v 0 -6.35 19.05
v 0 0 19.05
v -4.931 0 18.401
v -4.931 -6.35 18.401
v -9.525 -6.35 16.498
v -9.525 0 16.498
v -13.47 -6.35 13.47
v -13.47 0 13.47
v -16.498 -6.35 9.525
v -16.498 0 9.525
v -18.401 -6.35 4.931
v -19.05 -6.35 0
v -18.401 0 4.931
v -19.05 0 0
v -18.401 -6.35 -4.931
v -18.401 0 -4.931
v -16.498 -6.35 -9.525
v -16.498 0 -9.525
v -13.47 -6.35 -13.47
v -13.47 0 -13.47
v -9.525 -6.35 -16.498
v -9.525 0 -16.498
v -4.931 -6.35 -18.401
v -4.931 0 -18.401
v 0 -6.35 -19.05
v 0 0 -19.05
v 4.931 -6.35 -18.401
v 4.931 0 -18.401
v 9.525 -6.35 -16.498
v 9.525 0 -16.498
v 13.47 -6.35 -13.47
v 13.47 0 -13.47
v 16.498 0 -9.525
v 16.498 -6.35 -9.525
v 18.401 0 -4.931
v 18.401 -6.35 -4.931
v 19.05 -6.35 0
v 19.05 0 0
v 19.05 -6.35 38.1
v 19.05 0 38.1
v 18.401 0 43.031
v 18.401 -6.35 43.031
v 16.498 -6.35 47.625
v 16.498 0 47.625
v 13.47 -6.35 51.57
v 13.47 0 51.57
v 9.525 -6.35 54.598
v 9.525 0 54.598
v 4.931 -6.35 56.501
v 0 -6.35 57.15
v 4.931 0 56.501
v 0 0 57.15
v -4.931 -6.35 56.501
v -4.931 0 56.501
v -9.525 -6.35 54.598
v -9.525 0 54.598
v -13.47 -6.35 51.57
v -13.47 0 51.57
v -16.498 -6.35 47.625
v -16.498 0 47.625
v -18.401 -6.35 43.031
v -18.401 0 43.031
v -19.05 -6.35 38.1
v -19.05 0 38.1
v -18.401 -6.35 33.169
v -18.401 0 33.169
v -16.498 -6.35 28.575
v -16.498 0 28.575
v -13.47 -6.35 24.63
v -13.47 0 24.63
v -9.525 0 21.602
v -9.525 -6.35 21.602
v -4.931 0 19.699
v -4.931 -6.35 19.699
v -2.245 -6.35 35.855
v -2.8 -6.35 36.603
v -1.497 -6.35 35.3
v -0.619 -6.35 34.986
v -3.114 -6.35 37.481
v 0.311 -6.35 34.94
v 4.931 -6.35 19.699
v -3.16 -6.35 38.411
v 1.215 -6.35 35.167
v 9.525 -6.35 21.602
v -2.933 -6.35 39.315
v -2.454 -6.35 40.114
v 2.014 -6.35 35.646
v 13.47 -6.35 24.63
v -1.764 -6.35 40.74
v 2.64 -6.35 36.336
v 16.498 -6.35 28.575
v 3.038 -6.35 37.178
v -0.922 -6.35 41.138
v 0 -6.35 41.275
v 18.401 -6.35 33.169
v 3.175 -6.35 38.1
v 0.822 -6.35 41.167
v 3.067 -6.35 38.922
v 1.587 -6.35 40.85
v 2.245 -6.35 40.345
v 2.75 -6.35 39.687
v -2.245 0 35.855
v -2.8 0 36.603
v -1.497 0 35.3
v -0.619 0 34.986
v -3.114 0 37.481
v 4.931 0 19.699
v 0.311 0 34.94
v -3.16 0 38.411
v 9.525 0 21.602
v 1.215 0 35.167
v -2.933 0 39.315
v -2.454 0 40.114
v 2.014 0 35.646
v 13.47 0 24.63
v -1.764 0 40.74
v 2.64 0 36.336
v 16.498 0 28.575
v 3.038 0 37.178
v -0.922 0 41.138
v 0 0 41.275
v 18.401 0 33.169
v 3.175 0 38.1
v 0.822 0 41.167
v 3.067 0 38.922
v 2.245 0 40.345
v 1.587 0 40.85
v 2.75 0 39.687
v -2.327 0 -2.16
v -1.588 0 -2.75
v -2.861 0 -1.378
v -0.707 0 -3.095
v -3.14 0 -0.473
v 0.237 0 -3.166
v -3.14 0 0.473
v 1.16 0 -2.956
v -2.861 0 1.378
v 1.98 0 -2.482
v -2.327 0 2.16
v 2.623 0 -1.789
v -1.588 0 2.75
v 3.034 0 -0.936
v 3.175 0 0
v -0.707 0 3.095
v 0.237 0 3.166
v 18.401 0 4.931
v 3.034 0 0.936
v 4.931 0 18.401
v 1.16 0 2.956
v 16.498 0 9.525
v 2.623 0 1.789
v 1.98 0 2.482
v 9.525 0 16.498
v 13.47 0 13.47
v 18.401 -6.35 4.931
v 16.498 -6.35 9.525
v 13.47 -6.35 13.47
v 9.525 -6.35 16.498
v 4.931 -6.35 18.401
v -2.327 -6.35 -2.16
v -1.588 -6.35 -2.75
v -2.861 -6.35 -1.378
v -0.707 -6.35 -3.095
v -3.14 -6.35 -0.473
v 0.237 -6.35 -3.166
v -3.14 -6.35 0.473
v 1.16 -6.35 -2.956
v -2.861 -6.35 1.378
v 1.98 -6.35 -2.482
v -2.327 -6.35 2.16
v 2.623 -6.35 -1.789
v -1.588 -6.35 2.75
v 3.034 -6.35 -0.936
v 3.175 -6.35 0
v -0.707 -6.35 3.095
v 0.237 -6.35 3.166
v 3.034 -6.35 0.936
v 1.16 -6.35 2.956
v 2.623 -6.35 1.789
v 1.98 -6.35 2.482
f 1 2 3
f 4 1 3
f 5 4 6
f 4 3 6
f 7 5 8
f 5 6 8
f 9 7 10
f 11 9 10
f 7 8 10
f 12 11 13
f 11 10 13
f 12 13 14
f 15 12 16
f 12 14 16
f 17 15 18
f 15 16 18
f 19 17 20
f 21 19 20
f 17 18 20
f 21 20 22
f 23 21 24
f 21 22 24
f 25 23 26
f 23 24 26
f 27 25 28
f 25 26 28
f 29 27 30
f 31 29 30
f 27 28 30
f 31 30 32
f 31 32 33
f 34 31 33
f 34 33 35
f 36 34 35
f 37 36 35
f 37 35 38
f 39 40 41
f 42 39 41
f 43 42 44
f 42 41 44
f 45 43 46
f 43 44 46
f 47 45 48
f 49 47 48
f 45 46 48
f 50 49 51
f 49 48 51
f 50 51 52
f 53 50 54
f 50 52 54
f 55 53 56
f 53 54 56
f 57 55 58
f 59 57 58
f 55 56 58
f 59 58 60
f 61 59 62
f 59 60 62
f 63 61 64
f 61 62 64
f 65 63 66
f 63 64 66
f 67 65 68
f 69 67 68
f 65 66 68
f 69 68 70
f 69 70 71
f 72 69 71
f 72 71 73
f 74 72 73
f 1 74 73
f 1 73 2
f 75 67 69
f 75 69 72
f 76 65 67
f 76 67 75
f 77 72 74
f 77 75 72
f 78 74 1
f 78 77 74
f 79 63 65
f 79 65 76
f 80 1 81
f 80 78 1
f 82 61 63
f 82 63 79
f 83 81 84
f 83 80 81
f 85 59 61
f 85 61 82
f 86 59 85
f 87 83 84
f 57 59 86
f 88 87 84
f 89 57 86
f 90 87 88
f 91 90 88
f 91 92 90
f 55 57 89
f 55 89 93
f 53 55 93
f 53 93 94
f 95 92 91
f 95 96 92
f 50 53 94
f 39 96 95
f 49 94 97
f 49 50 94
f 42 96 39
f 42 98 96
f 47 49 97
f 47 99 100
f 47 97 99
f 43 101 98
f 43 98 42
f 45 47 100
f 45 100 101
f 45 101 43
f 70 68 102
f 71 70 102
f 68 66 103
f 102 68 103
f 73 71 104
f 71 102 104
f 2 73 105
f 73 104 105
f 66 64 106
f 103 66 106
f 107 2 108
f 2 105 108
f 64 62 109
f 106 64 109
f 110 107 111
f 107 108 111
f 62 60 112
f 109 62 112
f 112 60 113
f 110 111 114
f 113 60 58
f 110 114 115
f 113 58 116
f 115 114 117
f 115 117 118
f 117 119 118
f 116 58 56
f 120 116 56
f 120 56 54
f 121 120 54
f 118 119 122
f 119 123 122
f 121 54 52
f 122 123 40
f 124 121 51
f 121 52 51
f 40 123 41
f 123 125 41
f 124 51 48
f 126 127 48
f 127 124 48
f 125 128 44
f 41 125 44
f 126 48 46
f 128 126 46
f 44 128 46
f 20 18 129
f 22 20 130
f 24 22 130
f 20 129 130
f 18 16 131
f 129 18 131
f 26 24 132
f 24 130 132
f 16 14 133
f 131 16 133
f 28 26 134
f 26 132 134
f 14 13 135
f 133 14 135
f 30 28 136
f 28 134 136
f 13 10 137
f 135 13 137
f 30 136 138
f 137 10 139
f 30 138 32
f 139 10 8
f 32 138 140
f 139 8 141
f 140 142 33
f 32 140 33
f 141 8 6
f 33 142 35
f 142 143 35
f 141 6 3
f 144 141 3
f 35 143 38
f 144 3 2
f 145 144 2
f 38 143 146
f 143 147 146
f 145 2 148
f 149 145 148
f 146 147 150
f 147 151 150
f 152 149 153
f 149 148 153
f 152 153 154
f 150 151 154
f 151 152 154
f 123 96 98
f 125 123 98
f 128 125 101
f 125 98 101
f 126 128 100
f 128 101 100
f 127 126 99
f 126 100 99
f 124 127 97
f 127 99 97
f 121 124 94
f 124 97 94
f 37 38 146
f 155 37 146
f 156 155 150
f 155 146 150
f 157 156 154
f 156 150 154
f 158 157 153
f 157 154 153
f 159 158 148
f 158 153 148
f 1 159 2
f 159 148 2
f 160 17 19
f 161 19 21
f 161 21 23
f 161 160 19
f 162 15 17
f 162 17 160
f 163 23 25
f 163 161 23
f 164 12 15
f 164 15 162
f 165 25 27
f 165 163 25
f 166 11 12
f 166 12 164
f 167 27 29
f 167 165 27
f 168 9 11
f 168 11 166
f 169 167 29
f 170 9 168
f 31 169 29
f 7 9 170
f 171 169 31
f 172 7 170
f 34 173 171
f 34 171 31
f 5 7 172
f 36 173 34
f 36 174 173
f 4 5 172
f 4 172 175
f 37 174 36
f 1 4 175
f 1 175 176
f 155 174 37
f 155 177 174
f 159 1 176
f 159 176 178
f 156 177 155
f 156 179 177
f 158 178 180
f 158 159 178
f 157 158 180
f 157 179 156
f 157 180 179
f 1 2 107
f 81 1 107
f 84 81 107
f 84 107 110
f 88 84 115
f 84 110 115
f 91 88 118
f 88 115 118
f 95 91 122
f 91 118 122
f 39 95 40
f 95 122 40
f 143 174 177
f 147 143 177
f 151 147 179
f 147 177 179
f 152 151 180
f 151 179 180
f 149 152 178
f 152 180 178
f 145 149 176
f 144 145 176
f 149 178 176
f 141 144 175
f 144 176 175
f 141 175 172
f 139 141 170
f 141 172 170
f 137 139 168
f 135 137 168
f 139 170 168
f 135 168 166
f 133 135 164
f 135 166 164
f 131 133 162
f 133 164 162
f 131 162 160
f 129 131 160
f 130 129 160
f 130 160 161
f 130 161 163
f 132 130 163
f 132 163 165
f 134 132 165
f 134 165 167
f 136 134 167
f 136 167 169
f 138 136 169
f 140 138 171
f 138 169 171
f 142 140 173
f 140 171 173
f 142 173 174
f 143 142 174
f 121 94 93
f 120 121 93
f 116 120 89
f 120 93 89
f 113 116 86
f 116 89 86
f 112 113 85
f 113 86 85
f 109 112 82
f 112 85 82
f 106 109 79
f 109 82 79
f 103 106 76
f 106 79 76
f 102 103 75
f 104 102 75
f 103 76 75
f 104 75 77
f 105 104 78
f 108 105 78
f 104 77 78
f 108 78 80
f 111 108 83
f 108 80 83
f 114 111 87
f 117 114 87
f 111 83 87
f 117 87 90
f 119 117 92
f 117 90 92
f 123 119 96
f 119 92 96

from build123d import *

# Parameters (mm, degrees)
F1_DEPTH = 6.35
F2_R     = 3.175
F4_DEPTH = 6.35


with BuildPart() as f1:
    # F0 (on Front) → F1 (new body)
    with BuildSketch(Plane.XZ):
        with BuildLine():
            ThreePointArc((0, 19.05), (-13.470384, -13.470384), (19.05, 0))
            ThreePointArc((19.05, 0), (13.470384, 13.470384), (0, 19.05))
        make_face()
        with BuildLine():
            ThreePointArc((19.05, 38.1), (-13.470384, 51.570384), (0, 19.05))
            ThreePointArc((0, 19.05), (13.470384, 24.629616), (19.05, 38.1))
        make_face()
    extrude(amount=F1_DEPTH)

    # F3 (on face) + F2 (on face) → F4 (cut)
    with BuildSketch(Plane.XZ.offset(6.35)):
        with BuildLine():
            ThreePointArc((3.175, 38.1), (2.245064, 40.345064), (0, 41.275))
            ThreePointArc((0, 41.275), (-2.245064, 35.854936), (3.175, 38.1))
        make_face()
    with BuildSketch(Plane.XZ.offset(6.35)):
        Circle(F2_R)
    extrude(amount=-F4_DEPTH, mode=Mode.SUBTRACT)


solid = f1.part
